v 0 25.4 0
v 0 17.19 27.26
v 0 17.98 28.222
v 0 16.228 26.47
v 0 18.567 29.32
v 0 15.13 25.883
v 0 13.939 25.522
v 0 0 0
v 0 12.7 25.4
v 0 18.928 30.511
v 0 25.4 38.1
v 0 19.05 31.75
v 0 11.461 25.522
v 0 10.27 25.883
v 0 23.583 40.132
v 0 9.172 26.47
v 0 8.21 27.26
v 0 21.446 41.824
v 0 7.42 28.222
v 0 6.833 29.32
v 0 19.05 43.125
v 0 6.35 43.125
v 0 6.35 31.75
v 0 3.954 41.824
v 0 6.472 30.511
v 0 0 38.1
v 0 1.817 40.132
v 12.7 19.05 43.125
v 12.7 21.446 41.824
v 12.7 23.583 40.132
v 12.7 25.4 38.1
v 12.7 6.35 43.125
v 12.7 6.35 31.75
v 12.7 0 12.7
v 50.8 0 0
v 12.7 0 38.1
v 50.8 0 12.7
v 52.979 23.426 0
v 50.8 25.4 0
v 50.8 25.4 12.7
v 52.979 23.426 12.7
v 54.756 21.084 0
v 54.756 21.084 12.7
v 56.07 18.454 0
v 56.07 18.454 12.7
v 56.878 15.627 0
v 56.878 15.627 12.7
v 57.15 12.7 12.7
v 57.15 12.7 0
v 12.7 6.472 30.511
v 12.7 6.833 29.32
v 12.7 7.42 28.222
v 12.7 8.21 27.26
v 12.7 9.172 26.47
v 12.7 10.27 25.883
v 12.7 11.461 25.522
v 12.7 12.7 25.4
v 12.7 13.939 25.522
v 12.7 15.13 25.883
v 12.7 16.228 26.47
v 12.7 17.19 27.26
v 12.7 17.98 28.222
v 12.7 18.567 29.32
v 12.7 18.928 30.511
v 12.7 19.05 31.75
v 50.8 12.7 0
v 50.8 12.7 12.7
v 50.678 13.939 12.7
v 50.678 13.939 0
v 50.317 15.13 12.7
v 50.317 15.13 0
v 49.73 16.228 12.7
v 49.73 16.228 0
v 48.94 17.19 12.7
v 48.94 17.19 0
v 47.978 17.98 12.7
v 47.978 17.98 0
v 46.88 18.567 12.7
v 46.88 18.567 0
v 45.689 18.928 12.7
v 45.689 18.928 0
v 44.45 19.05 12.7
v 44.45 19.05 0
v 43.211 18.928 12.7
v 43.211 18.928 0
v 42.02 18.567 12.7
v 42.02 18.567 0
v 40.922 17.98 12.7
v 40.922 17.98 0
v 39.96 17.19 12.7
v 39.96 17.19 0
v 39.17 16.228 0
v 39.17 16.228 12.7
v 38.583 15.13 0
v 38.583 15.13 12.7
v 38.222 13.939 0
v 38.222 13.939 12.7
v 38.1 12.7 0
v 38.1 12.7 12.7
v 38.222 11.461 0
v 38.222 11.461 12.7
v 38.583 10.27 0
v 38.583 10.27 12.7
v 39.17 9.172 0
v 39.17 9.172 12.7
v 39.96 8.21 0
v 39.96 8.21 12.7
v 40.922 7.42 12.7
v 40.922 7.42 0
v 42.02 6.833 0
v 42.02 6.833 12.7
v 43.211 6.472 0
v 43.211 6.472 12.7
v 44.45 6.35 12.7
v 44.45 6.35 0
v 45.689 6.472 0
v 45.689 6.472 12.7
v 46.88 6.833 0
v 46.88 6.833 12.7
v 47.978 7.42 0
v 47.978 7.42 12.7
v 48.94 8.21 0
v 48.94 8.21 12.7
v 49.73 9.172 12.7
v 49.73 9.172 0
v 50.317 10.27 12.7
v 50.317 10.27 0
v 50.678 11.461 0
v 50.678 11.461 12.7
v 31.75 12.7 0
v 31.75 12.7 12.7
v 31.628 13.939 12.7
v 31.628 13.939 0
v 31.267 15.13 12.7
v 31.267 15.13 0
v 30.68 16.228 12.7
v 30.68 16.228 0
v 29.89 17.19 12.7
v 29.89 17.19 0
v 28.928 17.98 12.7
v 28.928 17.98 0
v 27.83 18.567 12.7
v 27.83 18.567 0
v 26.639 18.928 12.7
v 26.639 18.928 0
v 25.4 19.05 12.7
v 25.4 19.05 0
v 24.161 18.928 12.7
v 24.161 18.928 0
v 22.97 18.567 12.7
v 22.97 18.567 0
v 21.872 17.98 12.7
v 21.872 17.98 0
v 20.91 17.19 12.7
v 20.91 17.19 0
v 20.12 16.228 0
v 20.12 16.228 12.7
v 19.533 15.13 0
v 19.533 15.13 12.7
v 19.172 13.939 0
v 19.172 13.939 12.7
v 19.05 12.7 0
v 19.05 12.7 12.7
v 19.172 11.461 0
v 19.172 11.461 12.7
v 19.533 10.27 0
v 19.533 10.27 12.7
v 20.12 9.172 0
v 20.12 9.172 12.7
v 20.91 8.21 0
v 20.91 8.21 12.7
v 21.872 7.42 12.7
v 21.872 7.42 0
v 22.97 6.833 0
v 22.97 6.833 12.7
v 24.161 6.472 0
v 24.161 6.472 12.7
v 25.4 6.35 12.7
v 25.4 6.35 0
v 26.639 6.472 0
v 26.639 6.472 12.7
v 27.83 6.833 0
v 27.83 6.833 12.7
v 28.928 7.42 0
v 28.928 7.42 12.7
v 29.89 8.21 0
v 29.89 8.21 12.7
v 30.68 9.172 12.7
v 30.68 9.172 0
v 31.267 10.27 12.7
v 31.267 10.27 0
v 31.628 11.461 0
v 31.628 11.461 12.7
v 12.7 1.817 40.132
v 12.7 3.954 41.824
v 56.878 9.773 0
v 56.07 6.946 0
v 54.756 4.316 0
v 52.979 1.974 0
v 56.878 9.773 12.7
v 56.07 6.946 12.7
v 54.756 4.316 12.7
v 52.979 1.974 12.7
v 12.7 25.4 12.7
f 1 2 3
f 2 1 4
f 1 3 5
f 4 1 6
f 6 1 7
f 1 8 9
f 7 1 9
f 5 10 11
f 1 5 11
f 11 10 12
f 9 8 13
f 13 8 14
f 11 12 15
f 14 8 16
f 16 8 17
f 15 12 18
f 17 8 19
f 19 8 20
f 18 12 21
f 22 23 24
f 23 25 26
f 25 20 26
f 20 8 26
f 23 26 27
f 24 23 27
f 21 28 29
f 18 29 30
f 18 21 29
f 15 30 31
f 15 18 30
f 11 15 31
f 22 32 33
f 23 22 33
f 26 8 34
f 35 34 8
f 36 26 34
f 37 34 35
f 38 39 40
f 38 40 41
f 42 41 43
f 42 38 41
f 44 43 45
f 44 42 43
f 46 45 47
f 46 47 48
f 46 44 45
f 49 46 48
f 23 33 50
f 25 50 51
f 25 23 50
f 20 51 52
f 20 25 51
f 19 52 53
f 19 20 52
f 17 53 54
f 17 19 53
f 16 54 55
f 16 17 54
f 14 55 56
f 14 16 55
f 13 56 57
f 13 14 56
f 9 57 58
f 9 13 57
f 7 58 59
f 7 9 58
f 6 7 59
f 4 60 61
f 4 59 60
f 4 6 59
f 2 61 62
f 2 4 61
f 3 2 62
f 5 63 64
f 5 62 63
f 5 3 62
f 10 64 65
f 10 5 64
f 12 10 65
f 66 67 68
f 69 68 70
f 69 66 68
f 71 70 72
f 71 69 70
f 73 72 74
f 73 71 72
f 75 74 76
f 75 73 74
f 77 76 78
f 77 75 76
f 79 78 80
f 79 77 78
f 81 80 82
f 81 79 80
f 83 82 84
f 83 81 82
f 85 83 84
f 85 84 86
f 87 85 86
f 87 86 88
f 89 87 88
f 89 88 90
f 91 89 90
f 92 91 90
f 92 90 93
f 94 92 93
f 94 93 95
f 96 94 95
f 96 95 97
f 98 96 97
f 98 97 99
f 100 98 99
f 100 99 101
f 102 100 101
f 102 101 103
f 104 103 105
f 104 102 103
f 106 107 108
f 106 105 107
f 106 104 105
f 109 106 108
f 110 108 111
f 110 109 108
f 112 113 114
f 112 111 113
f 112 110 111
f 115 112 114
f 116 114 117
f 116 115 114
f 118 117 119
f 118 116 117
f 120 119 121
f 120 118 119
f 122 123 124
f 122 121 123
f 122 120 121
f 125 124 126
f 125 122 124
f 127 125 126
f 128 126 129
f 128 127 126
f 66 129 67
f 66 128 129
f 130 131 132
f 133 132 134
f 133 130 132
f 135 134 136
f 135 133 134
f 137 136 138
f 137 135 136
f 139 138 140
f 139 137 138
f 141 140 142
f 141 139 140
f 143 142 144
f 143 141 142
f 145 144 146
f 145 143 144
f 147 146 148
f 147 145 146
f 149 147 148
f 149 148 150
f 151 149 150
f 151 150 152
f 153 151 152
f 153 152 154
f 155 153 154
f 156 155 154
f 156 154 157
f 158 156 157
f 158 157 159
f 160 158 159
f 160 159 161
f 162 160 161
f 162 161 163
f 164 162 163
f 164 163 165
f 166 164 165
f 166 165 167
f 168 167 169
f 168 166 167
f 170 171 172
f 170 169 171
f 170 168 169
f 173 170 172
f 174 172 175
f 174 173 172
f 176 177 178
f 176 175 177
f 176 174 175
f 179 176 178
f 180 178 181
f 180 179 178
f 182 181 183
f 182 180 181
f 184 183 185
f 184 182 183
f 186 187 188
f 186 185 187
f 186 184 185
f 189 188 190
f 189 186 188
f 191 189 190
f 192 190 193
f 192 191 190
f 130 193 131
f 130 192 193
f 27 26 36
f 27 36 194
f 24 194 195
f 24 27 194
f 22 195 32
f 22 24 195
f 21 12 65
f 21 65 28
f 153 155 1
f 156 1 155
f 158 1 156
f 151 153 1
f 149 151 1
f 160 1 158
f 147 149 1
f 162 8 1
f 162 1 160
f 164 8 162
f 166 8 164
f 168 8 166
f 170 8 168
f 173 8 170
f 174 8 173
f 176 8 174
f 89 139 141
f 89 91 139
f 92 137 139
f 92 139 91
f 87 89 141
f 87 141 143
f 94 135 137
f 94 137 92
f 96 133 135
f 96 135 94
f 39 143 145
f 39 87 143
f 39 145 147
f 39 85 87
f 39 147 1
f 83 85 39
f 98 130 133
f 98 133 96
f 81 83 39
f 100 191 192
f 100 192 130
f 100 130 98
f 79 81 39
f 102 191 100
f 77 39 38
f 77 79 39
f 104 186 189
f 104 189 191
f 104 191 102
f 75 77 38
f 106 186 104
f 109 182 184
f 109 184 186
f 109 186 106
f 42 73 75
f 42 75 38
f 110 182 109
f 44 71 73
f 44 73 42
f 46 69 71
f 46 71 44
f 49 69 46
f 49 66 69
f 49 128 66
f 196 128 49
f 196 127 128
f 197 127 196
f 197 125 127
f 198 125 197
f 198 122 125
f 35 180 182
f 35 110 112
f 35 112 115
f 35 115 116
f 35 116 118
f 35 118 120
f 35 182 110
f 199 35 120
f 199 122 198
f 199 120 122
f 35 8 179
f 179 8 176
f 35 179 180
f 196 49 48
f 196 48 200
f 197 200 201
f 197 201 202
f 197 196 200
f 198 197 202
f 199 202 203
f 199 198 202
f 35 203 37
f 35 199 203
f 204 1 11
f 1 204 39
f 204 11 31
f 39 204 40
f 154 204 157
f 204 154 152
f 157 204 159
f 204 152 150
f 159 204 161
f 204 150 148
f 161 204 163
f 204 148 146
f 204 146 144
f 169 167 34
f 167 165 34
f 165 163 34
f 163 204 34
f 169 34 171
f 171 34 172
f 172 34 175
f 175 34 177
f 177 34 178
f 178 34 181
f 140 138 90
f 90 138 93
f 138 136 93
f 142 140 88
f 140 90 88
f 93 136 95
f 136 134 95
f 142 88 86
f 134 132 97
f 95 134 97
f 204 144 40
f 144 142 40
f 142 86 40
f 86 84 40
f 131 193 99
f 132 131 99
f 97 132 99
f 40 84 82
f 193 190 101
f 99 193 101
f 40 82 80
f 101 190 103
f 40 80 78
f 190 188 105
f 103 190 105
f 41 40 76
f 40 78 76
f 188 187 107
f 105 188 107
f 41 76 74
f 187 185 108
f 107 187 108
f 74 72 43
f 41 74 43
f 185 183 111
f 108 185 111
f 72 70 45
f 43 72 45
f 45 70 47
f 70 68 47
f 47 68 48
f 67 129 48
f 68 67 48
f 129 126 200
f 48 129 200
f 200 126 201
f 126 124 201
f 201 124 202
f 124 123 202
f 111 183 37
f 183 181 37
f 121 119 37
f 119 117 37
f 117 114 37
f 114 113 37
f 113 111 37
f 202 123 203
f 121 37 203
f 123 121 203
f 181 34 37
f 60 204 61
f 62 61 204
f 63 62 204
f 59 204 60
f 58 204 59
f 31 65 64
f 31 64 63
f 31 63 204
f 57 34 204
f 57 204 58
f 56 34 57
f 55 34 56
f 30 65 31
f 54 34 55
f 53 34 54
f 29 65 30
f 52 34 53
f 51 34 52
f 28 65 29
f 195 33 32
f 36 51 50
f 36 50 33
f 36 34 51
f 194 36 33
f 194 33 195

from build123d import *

# Parameters (mm, degrees)
F0_W      = 57.15
F0_H      = 44.45
F1_DEPTH  = 25.4
F2_W      = 44.45
F2_H      = 31.75
F3_DEPTH  = 25.4
F5_DEPTH  = 25.4
F6_R      = 6.35
F7_DEPTH  = 25.4
F9_DEPTH  = 25.4
F11_DEPTH = 25.4


with BuildPart() as f1:
    # F0 (on Front) → F1 (new body)
    with BuildSketch(Plane.XZ):
        with Locations((28.575, 22.225)):
            Rectangle(F0_W, F0_H)
    extrude(amount=-F1_DEPTH)

    # F2 (on Front) → F3 (cut)
    with BuildSketch(Plane.XZ):
        with Locations((34.925, 28.575)):
            Rectangle(F2_W, F2_H)
    extrude(amount=-F3_DEPTH, mode=Mode.SUBTRACT)

    # F4 (on Top) → F5 (cut)
    with BuildSketch(Plane.XY):
        with BuildLine():
            ThreePointArc((50.8, 25.4), (55.474032, 19.799516), (57.15, 12.7))
            Line((57.15, 12.7), (57.15, 25.4))
            Line((57.15, 25.4), (50.8, 25.4))
        make_face()
        with BuildLine():
            ThreePointArc((57.15, 12.7), (55.474032, 5.600484), (50.8, 0))
            Line((50.8, 0), (57.15, 0))
            Line((57.15, 0), (57.15, 12.7))
        make_face()
    extrude(amount=F5_DEPTH, mode=Mode.SUBTRACT)

    # F6 (on Top) → F7 (cut)
    with BuildSketch(Plane.XY):
        with Locations((25.4, 12.7)):
            Circle(F6_R)
        with Locations((44.45, 12.7)):
            Circle(F6_R)
    extrude(amount=F7_DEPTH, mode=Mode.SUBTRACT)

    # F8 (on Right) → F9 (cut)
    with BuildSketch(Plane.YZ):
        with BuildLine():
            Line((19.05, 44.45), (6.35, 44.45))
            Line((6.35, 44.45), (6.35, 31.75))
            ThreePointArc((6.35, 31.75), (12.7, 25.4), (19.05, 31.75))
            Line((19.05, 31.75), (19.05, 44.45))
        make_face()
    extrude(amount=F9_DEPTH, mode=Mode.SUBTRACT)

    # F10 (on Right) → F11 (cut)
    with BuildSketch(Plane.YZ):
        with BuildLine():
            ThreePointArc((0, 38.1), (5.600484, 42.774032), (12.7, 44.45))
            Line((12.7, 44.45), (0, 44.45))
            Line((0, 44.45), (0, 38.1))
        make_face()
        with BuildLine():
            ThreePointArc((12.7, 44.45), (19.799516, 42.774032), (25.4, 38.1))
            Line((25.4, 38.1), (25.4, 44.45))
            Line((25.4, 44.45), (12.7, 44.45))
        make_face()
    extrude(amount=F11_DEPTH, mode=Mode.SUBTRACT)


solid = f1.part
